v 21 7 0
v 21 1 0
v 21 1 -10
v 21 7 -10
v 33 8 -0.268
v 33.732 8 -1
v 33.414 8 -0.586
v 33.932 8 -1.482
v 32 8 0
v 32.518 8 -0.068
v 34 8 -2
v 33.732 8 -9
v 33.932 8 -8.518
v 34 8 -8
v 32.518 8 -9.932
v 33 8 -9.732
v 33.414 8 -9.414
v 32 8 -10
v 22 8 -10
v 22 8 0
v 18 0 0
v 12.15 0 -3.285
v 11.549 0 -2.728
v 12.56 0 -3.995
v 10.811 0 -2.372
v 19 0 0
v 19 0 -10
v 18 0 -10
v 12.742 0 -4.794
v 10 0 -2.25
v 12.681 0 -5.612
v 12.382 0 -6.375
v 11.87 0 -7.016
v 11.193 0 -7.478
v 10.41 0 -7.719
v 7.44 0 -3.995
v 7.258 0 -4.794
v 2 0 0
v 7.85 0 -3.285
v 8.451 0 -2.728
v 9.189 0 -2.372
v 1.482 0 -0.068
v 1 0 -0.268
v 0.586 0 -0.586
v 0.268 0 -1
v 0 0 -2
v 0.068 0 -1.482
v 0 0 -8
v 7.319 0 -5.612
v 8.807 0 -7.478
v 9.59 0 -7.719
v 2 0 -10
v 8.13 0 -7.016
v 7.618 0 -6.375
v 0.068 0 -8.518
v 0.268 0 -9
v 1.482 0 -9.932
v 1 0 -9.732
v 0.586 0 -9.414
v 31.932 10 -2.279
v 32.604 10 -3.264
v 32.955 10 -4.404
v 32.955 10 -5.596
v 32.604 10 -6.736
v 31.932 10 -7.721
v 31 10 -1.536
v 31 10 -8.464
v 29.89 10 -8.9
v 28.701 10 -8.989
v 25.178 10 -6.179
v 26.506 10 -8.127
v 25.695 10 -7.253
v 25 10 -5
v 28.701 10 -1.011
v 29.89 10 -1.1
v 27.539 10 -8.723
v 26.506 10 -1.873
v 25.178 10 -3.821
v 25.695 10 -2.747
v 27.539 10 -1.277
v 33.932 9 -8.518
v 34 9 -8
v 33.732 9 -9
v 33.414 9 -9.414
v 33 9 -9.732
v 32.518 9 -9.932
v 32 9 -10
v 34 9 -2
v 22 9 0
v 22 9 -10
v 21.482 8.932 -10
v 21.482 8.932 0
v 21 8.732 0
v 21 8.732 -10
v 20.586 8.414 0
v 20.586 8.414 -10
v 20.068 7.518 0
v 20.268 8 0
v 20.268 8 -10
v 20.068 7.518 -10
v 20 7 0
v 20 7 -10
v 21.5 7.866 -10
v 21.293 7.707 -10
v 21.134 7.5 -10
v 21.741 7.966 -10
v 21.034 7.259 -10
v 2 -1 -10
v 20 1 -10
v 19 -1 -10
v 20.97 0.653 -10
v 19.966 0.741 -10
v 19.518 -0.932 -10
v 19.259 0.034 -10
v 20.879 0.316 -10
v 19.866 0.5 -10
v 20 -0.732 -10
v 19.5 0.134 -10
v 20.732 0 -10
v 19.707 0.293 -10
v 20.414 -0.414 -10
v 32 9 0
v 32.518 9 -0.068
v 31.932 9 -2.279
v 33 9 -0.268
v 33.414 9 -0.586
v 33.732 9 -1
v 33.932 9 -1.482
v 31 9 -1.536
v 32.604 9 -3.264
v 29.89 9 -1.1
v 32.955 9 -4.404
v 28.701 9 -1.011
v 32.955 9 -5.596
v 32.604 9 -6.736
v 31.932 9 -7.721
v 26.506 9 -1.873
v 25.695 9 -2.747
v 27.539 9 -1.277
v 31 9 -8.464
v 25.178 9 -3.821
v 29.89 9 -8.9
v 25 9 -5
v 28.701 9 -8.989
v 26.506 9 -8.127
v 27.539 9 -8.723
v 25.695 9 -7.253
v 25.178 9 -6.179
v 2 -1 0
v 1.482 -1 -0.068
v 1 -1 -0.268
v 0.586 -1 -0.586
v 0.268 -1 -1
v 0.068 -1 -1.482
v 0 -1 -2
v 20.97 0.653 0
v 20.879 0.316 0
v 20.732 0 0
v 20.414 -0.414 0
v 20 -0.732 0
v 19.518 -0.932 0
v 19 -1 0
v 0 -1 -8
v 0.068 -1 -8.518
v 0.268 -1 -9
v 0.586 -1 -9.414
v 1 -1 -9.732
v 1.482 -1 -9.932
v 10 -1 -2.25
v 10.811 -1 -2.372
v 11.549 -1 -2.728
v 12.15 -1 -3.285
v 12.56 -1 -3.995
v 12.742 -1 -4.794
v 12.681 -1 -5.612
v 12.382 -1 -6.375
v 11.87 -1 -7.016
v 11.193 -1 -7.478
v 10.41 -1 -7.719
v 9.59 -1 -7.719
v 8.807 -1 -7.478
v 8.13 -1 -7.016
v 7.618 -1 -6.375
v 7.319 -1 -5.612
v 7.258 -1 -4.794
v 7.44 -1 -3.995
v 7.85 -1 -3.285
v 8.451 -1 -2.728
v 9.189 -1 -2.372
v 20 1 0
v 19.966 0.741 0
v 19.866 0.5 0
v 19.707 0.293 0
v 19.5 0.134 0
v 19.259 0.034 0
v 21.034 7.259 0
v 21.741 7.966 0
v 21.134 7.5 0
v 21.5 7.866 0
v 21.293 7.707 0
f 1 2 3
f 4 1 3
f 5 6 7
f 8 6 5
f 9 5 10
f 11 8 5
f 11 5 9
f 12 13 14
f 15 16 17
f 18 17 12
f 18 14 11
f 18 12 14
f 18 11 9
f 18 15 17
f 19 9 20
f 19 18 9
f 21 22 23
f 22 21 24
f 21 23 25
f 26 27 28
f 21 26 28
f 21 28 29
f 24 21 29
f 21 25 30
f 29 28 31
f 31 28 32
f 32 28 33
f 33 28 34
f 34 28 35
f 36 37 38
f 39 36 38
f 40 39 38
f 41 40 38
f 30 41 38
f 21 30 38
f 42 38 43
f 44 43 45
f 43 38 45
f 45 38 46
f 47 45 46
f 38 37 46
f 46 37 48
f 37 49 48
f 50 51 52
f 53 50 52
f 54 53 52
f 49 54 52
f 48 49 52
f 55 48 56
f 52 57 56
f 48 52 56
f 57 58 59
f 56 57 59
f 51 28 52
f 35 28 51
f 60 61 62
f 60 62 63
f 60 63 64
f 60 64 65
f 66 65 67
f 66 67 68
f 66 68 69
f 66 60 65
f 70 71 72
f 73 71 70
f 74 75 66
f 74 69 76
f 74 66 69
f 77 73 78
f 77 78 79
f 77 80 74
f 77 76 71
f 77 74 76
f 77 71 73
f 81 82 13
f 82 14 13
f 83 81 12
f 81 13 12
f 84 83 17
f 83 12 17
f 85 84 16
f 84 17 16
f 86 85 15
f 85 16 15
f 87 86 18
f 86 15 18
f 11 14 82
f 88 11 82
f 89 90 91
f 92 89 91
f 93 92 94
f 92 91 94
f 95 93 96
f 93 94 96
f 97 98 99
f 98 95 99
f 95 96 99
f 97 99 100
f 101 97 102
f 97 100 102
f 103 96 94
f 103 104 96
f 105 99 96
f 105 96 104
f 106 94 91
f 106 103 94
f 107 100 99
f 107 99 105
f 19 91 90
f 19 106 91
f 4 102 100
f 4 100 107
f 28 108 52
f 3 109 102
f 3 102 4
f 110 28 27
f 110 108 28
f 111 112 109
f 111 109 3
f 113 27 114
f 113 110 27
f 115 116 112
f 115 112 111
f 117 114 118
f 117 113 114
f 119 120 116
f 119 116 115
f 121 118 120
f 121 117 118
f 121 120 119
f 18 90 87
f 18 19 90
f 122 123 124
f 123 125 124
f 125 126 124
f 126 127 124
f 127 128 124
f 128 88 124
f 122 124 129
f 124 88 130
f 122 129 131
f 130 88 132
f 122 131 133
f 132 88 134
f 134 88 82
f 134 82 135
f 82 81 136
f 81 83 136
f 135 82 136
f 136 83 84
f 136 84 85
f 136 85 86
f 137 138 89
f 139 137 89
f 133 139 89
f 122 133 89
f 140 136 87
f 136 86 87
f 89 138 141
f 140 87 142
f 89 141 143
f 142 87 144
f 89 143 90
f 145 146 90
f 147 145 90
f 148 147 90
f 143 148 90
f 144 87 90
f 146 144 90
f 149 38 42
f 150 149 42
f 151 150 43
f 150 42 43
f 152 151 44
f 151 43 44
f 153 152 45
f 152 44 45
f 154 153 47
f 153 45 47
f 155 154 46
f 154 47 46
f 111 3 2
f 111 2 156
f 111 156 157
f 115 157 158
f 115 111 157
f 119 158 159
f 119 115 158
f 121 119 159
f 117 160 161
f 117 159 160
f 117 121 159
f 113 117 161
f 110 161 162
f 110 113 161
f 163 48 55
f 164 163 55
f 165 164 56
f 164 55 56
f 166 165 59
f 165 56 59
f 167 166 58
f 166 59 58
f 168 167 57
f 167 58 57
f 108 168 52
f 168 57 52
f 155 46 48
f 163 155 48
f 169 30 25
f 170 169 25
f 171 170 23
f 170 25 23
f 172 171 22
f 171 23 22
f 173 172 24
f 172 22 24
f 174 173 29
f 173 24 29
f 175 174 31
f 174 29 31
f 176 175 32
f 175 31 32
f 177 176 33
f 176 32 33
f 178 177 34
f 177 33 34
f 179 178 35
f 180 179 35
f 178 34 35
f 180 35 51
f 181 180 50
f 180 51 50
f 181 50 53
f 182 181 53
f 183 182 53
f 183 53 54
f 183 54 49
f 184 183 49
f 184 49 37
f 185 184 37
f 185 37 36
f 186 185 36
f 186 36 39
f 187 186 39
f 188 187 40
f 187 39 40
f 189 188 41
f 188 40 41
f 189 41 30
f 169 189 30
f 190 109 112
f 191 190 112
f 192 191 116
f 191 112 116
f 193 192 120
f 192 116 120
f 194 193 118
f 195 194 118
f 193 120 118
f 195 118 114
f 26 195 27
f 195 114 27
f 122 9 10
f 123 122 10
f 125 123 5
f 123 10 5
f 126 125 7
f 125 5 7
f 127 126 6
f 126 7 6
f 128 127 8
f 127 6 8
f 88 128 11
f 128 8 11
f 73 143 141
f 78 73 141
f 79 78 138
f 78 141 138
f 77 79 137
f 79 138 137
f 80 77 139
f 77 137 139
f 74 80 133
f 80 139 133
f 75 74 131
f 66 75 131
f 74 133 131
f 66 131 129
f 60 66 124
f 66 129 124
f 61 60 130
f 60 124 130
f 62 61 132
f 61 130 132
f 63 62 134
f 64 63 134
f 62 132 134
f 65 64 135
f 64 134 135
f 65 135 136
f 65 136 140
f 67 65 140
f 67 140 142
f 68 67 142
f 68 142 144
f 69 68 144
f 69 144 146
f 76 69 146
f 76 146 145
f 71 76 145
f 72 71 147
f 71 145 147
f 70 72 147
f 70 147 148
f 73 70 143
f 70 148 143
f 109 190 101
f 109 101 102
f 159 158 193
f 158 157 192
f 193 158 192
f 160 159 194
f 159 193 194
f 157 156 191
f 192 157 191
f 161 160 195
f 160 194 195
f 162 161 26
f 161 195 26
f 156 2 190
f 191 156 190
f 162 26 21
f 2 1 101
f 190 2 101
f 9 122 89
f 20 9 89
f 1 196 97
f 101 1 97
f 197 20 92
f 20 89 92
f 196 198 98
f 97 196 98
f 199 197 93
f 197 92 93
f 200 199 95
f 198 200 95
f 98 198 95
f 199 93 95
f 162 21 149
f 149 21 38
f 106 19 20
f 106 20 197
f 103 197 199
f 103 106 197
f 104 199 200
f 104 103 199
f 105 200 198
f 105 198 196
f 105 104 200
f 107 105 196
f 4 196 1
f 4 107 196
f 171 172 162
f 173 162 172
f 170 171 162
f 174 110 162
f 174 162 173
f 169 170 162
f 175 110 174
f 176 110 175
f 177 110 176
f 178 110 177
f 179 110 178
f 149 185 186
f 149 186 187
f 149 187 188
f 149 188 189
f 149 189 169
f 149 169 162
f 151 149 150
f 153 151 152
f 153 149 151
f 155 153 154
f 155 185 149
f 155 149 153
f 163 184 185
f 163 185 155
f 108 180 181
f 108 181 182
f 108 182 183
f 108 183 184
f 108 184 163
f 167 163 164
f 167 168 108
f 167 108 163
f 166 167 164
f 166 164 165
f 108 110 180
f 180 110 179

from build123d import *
from build123d.topology import SkipClean

# Parameters (mm, degrees)
SKETCH1_R           = 2.75
BASE_FLANGE1_DEPTH  = 1
JOG1_START          = -10
JOG1_DEPTH          = 10
JOG1_START_2        = -8
JOG1_2_DEPTH        = 6
JOG1_START_3        = 7
JOG1_3_DEPTH        = 1.974011807
JOG1_4_OUTLINE_W    = 1
JOG1_4_OUTLINE_H    = 2
JOG1_4_DEPTH        = 7.152182036
JOG1_START_4        = 8
JOG1_5_DEPTH        = 1
JOG1_6_DEPTH        = 10
JOG1_7_DEPTH        = 10
SKETCH12_R          = 4
BOSS_EXTRUDE1_DEPTH = 1


with BuildPart() as part:
    # Base-Flange1: sheet metal written as solids
    # Sketch1 → Base-Flange1 (new body)
    with BuildSketch(Plane(origin=(0, 0, 0), x_dir=(1, 0, 0), z_dir=(0, 1, 0))):
        with BuildLine():
            Line((0, 2), (0, 8))
            ThreePointArc((0, 8), (0.585786438, 9.414213562), (2, 10))
            Line((2, 10), (32, 10))
            ThreePointArc((32, 10), (33.414213562, 9.414213562), (34, 8))
            Line((34, 8), (34, 2))
            ThreePointArc((34, 2), (33.414213562, 0.585786438), (32, 0))
            Line((32, 0), (2, 0))
            ThreePointArc((2, 0), (0.585786438, 0.585786438), (0, 2))
        make_face()
        with Locations(Location((10, 5, 0), (0, 0, 270))):
            Circle(SKETCH1_R, mode=Mode.SUBTRACT)
    extrude(amount=-BASE_FLANGE1_DEPTH)

    # Jog1: read off the stored shape, not the designer's step
    # Jog1 outline → Jog1 (cut)
    with BuildSketch(Plane.XY.offset(JOG1_START)):
        with BuildLine():
            Line((34, 0), (20.732050807, 0))
            ThreePointArc((20.732050807, 0), (20, -0.732050807), (19, -1))
            Line((19, -1), (34, -1))
            Line((34, -1), (34, 0))
        make_face()
    extrude(amount=JOG1_DEPTH, mode=Mode.SUBTRACT)

    # Jog1 2 outline → Jog1 2 (add)
    with BuildSketch(Plane.XY.offset(JOG1_START_2)):
        with BuildLine():
            Line((21, 1), (21, 7))
            ThreePointArc((21, 7), (21.292893219, 7.707106781), (22, 8))
            Line((22, 8), (34, 8))
            Line((34, 8), (34, 9))
            Line((34, 9), (22, 9))
            ThreePointArc((22, 9), (20.585786438, 8.414213562), (20, 7))
            Line((20, 7), (20, 1))
            ThreePointArc((20, 1), (19.707106781, 0.292893219), (19, 0))
            Line((19, 0), (20.732050807, 0))
            ThreePointArc((20.732050807, 0), (20.931851652, 0.48236191), (21, 1))
        make_face()
    extrude(amount=JOG1_2_DEPTH)

    # Jog1 3 outline → Jog1 3 (add)
    with BuildSketch(Plane(origin=(0, 0, 0), x_dir=(1, 0, 0), z_dir=(0, 1, 0)).offset(JOG1_START_3)):
        with BuildLine():
            Line((20, 10), (20, 8))
            Line((20, 8), (34, 8))
            ThreePointArc((34, 8), (33.414213562, 9.414213562), (32, 10))
            Line((32, 10), (20, 10))
        make_face()
        with BuildLine():
            Line((34, 2), (20, 2))
            Line((20, 2), (20, 0))
            Line((20, 0), (32, 0))
            ThreePointArc((32, 0), (33.414213562, 0.585786438), (34, 2))
        make_face()
    extrude(amount=JOG1_3_DEPTH)

    # Jog1 4 outline → Jog1 4 (add)
    with BuildSketch(Plane(origin=(0, 0, 0), x_dir=(1, 0, 0), z_dir=(0, 1, 0))):
        with Locations((20.5, 9)):
            Rectangle(JOG1_4_OUTLINE_W, JOG1_4_OUTLINE_H)
        with Locations((20.5, 1)):
            Rectangle(JOG1_4_OUTLINE_W, JOG1_4_OUTLINE_H)
    extrude(amount=JOG1_4_DEPTH)

    # Jog1 5 outline → Jog1 5 (add)
    with BuildSketch(Plane(origin=(0, 0, 0), x_dir=(1, 0, 0), z_dir=(0, 1, 0)).offset(JOG1_START_4)):
        with BuildLine():
            Line((32, 10), (21, 10))
            Line((21, 10), (21, 8))
            Line((21, 8), (34, 8))
            ThreePointArc((34, 8), (33.414213562, 9.414213562), (32, 10))
        make_face()
        with BuildLine():
            Line((34, 2), (21, 2))
            Line((21, 2), (21, 0))
            Line((21, 0), (32, 0))
            ThreePointArc((32, 0), (33.414213562, 0.585786438), (34, 2))
        make_face()
    extrude(amount=JOG1_5_DEPTH)

    # Jog1 6 outline → Jog1 6 (cut)
    with SkipClean():  # the faces are left unmerged after this step: merging them gives an invalid solid
        with BuildSketch(Plane.XY.offset(JOG1_START)):
            with BuildLine():
                Line((21, 7), (21, 1))
                ThreePointArc((21, 1), (20.732050807, -1e-09), (19.999999998, -0.732050808))
                Line((19.999999998, -0.732050808), (19.999999995, -1))
                Line((19.999999995, -1), (35, -1))
                Line((35, -1), (35, 8))
                Line((35, 8), (22, 8))
                ThreePointArc((22, 8), (21.292893219, 7.707106781), (21, 7))
            make_face()
            with BuildLine():
                Line((21, 9), (21, 8.974011807))
                Line((21, 8.974011807), (20, 8.974011807))
                Line((20, 8.974011807), (20, 7))
                ThreePointArc((20, 7), (20.585786438, 8.414213562), (22, 9))
                Line((22, 9), (35, 9.000000008))
                Line((35, 9.000000008), (35, 10))
                Line((35, 10), (21.000000006, 10))
                Line((21.000000006, 10), (21, 9))
            make_face()
        extrude(amount=JOG1_6_DEPTH, mode=Mode.SUBTRACT)
    add(part.part.scale(1), mode=Mode.REPLACE)  # the faces are merged on a copy

    # Jog1 7 outline → Jog1 7 (add)
    with BuildSketch(Plane.XY.offset(JOG1_START)):
        with BuildLine():
            ThreePointArc((19, -1), (19.517638089, -0.931851653), (19.999999998, -0.732050808))
            Line((19.999999998, -0.732050808), (19.999999996, 0))
            Line((19.999999996, 0), (20, 1))
            ThreePointArc((20, 1), (19.707106781, 0.292893219), (19, 0))
            Line((19, 0), (18, -1e-09))
            Line((18, -1e-09), (18, -1))
            Line((18, -1), (19, -1))
        make_face()
    extrude(amount=JOG1_7_DEPTH)

    # Sketch12 → Boss-Extrude1 (add)
    with BuildSketch(Plane(origin=(0, 9, 0), x_dir=(1, 0, 0), z_dir=(0, 1, 0))):
        with Locations(Location((29, 5, 0), (0, 0, 180))):
            Circle(SKETCH12_R)
    extrude(amount=BOSS_EXTRUDE1_DEPTH)


solid = part.part
